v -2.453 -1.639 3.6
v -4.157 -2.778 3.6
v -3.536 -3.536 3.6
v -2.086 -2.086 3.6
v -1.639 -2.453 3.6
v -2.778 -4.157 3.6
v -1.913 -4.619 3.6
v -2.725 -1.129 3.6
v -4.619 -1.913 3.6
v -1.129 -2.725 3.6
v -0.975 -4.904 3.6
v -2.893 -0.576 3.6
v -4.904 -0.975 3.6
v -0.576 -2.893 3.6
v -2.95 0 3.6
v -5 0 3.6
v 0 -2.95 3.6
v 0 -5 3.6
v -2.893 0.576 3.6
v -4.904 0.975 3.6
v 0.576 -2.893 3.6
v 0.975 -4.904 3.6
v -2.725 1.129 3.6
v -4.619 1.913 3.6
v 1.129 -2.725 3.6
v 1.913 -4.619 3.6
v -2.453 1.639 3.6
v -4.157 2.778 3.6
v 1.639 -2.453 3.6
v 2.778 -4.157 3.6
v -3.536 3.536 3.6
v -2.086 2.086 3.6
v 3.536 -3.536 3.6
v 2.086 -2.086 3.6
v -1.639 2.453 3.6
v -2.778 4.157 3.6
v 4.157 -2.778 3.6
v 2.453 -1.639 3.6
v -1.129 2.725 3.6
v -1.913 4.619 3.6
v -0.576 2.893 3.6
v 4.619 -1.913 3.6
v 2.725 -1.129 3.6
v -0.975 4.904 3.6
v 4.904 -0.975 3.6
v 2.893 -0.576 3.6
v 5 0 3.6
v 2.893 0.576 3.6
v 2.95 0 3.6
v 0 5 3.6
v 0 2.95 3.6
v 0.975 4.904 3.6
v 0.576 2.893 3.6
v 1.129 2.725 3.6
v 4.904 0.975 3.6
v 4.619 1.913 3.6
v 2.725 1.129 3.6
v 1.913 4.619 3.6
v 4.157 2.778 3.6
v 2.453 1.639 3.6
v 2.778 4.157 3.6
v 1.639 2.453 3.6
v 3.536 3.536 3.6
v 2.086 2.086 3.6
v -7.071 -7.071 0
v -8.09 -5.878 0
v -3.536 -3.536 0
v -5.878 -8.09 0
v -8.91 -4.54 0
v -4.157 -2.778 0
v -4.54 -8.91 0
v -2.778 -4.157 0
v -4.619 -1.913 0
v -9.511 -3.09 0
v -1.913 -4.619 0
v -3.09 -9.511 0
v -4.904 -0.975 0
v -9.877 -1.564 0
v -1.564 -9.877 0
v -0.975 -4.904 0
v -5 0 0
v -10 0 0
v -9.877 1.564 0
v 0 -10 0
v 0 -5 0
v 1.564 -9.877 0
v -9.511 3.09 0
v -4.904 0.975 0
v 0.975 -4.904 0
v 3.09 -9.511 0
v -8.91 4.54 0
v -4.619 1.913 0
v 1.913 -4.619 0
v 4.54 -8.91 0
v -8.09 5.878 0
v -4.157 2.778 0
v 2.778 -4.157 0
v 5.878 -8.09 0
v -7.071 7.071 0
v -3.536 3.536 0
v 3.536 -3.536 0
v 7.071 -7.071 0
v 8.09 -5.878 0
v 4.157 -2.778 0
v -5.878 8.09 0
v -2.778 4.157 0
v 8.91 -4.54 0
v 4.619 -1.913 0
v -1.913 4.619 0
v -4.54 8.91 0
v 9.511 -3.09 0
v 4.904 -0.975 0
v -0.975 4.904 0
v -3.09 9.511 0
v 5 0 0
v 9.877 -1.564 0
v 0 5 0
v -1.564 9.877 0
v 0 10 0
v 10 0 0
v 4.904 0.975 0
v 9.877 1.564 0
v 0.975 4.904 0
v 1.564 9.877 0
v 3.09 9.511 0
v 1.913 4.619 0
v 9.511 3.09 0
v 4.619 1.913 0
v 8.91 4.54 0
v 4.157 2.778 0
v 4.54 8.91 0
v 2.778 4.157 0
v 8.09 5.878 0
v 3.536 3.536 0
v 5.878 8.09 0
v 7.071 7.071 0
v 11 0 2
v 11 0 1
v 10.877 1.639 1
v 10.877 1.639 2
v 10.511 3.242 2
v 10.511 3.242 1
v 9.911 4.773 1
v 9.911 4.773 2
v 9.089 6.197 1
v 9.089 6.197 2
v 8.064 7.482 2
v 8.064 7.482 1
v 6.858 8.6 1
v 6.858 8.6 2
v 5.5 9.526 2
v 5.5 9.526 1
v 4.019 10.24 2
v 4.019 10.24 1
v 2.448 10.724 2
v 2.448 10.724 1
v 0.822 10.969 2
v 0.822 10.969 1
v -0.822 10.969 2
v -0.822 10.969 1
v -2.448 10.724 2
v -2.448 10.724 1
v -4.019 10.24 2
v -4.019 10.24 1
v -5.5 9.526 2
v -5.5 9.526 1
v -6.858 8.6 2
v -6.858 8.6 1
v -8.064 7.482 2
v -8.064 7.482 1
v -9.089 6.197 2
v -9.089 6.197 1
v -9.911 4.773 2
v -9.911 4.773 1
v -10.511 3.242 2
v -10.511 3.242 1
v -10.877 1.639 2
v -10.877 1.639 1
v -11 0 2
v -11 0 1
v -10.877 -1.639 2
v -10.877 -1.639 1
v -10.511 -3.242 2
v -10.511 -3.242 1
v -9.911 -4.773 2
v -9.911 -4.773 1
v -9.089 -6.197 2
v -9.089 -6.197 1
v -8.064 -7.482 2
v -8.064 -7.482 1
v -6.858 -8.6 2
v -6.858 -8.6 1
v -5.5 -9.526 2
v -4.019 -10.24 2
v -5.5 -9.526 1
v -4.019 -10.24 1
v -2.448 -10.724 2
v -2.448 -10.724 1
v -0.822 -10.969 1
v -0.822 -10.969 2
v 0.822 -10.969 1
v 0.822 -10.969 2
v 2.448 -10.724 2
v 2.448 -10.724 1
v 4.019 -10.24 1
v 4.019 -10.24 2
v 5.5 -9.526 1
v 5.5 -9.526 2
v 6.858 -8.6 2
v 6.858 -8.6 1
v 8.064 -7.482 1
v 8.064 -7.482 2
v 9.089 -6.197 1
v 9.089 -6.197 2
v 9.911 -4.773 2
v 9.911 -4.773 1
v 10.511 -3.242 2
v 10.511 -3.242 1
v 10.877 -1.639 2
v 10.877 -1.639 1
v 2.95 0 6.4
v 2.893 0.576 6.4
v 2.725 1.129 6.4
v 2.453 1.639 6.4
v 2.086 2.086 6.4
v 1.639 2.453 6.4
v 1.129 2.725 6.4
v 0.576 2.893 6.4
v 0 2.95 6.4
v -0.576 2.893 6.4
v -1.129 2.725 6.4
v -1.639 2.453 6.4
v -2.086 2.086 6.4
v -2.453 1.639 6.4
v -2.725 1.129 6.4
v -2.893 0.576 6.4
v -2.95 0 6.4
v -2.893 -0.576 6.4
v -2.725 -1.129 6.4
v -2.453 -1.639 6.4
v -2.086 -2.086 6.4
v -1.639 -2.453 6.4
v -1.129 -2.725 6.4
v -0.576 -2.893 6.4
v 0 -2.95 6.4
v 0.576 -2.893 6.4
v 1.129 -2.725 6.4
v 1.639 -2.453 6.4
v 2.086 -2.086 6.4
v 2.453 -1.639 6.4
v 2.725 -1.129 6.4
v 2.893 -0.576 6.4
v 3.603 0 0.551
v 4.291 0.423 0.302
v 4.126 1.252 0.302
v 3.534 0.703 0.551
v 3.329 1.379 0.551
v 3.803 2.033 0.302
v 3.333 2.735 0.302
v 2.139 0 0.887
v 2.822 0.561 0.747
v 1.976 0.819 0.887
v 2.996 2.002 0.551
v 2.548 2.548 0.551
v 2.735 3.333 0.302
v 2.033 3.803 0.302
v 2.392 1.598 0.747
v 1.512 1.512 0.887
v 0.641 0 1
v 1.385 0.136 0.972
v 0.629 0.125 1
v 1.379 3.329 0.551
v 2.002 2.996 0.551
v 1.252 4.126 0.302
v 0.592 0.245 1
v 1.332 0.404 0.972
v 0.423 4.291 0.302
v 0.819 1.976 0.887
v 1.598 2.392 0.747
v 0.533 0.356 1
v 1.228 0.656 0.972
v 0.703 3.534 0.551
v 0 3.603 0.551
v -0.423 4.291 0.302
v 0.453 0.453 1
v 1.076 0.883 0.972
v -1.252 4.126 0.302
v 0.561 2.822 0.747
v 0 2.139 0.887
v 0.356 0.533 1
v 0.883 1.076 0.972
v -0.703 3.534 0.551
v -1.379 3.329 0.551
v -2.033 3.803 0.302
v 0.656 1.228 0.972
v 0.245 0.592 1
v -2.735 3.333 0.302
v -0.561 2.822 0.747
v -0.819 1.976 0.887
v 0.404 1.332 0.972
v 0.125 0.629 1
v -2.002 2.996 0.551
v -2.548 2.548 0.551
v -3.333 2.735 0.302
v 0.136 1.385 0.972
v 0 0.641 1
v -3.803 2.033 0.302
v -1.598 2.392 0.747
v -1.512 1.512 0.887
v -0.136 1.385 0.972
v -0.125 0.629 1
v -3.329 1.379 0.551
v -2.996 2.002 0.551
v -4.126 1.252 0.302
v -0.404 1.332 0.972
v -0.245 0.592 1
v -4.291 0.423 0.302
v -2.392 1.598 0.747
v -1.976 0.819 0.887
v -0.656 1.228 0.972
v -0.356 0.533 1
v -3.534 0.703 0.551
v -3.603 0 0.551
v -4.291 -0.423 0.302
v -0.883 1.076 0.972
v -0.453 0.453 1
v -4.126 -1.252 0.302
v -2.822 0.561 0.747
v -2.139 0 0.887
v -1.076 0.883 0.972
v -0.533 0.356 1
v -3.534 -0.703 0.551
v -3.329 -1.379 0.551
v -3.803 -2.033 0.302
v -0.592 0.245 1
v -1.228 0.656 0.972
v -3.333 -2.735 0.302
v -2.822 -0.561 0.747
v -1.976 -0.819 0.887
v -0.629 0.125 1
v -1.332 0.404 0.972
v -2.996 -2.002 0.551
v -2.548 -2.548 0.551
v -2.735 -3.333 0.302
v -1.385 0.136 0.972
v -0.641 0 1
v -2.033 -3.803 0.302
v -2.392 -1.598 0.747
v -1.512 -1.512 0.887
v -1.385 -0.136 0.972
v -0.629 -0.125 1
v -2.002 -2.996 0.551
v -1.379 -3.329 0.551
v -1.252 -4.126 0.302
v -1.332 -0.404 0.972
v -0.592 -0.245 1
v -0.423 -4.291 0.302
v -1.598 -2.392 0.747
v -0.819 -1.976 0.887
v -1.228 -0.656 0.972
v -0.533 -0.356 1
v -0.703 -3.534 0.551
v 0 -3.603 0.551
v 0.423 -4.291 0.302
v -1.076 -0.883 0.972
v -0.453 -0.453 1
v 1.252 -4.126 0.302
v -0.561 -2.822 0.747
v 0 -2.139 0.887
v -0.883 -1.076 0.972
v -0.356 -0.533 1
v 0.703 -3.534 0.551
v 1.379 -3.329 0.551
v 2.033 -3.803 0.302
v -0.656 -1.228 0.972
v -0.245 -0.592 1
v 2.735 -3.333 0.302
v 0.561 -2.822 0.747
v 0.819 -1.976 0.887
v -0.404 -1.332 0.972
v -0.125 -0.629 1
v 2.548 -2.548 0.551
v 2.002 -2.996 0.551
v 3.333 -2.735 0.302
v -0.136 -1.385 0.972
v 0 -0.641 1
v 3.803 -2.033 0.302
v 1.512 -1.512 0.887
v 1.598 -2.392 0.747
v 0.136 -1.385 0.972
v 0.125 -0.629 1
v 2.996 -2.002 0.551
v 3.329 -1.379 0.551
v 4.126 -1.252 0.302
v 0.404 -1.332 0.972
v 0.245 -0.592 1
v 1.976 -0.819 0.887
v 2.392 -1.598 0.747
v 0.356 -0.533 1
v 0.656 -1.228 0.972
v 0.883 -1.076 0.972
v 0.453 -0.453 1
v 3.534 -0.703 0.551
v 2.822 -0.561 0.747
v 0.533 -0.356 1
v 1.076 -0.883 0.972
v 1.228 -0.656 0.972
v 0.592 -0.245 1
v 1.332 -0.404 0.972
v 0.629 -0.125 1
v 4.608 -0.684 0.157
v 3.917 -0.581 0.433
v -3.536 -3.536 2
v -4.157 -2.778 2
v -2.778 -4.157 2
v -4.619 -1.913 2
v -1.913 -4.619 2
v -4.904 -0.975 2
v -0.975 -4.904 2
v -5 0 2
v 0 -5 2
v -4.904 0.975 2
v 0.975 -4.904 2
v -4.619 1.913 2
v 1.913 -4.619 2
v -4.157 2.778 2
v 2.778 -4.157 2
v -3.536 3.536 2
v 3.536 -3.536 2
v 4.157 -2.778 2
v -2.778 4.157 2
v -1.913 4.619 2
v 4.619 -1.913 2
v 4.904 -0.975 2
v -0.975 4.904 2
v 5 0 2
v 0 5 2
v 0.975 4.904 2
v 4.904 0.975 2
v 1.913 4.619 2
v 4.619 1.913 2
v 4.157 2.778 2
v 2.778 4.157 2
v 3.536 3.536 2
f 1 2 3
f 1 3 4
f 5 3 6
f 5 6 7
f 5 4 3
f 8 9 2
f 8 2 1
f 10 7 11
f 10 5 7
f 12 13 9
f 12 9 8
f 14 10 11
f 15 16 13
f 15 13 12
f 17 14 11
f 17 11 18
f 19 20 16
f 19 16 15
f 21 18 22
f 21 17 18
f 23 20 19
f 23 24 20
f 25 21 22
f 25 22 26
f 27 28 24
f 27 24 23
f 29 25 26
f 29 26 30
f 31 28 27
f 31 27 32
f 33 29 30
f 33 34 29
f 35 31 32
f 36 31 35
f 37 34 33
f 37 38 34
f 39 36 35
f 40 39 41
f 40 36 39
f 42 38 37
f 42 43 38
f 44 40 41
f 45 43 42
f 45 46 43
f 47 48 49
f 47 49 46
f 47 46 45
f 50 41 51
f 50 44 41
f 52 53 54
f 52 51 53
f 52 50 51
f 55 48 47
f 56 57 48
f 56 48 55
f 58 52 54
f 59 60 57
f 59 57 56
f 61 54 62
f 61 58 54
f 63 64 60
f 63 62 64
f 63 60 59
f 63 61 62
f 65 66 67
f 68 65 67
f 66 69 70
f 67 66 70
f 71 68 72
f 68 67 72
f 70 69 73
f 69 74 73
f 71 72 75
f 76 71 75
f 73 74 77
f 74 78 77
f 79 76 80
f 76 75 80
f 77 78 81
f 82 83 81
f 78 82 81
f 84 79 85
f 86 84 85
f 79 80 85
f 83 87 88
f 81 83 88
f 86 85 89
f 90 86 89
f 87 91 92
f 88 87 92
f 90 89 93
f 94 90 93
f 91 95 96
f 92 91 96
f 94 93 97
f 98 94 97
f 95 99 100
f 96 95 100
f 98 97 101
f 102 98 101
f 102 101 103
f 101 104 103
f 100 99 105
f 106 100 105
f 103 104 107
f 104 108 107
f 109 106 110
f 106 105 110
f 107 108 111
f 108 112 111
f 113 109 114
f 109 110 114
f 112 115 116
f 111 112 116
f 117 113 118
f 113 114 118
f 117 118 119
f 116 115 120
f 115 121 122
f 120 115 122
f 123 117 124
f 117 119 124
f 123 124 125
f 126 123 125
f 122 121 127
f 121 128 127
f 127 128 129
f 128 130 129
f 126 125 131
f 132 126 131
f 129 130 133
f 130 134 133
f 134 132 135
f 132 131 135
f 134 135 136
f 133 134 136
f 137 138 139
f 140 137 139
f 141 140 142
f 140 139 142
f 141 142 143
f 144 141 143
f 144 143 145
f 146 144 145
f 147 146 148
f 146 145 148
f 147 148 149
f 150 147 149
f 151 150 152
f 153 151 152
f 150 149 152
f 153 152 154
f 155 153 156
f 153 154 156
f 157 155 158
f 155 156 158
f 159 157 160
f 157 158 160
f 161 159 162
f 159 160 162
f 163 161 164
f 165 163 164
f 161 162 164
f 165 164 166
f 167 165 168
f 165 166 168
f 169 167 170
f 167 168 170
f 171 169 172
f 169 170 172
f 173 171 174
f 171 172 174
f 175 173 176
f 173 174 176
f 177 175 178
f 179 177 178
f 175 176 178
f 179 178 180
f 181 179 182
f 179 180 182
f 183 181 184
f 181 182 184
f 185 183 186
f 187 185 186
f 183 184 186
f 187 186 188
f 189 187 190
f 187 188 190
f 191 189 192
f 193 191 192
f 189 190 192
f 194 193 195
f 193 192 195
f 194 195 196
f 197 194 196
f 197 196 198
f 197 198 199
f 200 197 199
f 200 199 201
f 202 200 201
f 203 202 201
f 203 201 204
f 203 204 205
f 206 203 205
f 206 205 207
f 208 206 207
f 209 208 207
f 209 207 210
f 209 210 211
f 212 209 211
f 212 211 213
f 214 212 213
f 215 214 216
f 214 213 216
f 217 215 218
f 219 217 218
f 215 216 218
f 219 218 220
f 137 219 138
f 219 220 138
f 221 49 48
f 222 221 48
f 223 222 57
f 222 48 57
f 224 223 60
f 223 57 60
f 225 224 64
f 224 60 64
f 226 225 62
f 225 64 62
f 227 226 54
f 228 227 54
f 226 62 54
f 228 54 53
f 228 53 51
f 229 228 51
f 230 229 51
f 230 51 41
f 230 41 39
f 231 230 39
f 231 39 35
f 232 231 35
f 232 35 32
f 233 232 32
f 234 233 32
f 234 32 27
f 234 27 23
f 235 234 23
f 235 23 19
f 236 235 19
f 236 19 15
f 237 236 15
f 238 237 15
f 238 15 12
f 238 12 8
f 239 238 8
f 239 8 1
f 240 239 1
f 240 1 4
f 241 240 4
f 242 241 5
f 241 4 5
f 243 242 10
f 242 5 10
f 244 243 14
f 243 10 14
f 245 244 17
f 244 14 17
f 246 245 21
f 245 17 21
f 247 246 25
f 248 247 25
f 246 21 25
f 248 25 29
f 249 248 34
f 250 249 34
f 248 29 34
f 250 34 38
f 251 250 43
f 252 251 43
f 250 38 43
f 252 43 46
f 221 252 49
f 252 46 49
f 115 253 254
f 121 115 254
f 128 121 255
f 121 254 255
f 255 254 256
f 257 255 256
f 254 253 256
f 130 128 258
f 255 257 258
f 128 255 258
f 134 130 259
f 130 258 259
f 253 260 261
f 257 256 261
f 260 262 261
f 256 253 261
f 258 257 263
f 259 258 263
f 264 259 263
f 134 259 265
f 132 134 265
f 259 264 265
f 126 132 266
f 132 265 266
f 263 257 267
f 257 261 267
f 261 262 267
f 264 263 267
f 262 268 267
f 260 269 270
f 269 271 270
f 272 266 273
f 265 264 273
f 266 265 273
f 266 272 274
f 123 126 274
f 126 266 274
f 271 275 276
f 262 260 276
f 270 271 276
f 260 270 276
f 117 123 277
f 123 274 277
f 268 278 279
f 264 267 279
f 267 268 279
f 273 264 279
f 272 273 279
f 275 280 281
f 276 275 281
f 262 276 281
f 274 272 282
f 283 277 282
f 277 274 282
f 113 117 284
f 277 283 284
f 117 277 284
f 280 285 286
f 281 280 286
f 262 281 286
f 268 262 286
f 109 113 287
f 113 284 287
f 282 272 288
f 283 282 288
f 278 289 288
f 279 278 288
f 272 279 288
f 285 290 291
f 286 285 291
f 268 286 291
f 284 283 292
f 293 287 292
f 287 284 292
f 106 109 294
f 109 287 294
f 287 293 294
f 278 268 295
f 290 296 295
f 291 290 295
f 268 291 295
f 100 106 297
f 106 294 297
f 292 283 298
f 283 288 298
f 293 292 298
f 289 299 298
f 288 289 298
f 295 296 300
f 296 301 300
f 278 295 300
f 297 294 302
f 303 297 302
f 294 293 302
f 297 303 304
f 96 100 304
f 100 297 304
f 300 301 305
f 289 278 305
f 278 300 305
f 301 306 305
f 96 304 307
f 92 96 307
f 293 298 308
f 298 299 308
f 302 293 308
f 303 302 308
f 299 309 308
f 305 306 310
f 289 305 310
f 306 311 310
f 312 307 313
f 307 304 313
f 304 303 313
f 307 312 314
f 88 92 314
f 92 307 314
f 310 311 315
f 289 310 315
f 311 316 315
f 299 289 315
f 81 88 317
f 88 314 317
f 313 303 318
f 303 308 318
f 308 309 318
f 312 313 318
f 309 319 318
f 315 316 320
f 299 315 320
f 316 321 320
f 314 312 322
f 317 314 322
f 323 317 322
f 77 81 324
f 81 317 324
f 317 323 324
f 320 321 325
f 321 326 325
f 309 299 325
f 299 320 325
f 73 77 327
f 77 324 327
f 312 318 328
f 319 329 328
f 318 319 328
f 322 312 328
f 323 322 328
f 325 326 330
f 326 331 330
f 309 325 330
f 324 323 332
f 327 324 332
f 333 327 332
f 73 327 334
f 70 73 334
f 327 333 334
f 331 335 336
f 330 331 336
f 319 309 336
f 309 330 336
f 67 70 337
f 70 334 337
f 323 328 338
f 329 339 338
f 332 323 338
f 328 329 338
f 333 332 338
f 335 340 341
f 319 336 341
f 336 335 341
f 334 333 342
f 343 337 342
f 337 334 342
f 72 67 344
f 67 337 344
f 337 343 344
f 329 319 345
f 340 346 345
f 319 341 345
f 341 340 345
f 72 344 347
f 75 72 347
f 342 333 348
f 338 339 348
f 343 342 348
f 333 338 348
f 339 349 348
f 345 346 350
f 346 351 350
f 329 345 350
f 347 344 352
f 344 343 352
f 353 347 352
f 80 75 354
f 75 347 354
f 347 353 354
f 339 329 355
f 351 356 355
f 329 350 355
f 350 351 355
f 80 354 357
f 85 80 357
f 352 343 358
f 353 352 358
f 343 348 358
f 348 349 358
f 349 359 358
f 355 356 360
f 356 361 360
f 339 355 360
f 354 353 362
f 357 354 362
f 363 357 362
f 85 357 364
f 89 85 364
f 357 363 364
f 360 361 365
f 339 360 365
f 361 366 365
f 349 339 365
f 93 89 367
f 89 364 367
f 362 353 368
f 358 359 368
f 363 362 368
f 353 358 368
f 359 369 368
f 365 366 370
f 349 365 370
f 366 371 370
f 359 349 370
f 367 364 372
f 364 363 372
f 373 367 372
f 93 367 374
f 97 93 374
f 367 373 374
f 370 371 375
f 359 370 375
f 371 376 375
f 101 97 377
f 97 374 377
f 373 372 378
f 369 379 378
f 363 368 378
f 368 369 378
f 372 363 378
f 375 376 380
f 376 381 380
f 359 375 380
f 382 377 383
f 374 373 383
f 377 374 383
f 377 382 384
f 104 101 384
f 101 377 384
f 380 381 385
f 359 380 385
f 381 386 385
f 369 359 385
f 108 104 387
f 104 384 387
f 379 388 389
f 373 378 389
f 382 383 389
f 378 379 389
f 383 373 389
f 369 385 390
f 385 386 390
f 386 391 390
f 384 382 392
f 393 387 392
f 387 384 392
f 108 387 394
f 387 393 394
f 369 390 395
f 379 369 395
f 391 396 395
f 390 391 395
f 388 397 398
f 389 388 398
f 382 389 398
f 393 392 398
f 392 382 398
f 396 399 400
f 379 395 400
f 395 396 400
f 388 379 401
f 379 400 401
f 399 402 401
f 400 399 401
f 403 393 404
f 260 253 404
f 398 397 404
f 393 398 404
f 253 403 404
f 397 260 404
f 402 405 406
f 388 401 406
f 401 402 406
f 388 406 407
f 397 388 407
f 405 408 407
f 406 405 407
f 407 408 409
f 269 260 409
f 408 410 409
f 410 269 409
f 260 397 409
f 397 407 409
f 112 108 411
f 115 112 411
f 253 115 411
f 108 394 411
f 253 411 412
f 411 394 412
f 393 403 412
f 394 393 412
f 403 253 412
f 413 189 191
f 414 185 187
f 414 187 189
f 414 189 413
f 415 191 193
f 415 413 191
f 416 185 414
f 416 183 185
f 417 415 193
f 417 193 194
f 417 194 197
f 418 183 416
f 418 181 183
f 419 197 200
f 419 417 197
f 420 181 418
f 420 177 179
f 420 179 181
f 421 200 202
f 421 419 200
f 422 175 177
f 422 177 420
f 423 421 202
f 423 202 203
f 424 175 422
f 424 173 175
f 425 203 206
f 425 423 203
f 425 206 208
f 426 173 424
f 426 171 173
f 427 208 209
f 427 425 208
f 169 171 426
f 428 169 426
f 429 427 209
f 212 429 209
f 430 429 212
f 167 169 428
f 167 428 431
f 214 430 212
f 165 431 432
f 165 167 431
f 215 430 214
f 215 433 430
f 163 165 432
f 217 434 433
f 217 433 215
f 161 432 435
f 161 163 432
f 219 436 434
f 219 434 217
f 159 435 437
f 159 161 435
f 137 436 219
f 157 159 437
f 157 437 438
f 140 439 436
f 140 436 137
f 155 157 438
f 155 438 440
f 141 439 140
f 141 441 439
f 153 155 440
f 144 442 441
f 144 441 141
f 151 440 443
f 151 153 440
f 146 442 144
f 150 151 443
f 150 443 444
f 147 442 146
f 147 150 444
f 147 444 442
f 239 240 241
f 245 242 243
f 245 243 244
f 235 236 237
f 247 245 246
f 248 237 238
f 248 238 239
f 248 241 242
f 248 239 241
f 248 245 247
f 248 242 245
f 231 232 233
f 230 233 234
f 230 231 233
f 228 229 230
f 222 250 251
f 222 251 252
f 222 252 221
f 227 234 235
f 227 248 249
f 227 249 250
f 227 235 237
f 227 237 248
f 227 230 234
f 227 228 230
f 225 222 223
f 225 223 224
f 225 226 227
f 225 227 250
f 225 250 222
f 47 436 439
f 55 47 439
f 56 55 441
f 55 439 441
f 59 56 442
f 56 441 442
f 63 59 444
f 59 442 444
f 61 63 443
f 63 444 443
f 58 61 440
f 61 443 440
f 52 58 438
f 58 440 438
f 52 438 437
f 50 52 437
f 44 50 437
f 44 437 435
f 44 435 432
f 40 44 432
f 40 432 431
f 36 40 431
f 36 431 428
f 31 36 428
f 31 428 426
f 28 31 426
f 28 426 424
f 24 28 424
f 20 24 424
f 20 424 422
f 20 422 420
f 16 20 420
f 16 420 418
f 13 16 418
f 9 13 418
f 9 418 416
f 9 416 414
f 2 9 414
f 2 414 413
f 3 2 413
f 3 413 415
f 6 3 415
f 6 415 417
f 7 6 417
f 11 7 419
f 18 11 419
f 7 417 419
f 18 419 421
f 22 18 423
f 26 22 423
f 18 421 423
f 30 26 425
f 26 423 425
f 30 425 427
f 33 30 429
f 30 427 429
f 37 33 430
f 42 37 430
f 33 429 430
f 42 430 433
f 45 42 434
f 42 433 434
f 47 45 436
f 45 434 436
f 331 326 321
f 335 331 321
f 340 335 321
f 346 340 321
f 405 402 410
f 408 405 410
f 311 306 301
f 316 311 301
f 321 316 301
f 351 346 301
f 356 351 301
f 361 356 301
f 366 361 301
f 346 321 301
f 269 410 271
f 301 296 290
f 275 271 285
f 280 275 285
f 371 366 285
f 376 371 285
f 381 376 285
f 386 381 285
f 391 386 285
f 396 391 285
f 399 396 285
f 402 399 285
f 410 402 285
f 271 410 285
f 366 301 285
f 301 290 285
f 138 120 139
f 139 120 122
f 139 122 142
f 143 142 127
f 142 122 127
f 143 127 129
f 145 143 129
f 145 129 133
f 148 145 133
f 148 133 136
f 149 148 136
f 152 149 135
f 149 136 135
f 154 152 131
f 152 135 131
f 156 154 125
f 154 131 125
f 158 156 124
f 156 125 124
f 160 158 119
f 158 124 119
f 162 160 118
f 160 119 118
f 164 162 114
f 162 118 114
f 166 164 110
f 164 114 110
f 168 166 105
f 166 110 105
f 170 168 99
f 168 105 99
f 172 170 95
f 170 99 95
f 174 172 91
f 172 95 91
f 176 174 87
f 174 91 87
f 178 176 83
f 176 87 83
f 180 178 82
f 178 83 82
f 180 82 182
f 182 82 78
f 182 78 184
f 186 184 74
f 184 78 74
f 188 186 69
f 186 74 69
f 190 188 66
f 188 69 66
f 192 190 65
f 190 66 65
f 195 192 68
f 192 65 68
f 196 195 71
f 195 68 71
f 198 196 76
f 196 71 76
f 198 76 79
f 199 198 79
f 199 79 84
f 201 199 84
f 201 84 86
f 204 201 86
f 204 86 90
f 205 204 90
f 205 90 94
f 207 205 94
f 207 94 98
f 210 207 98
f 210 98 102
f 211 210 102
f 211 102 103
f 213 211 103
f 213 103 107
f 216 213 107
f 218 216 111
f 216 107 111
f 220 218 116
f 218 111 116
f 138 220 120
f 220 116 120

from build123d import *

# Parameters (mm, degrees)
F0_R     = 11
F0_R_2   = 5
F1_DEPTH = 2
F0_R_3   = 2.95
F2_DEPTH = 3.6
F0_R_4   = 1.8
F3_DEPTH = 6.4
F4_DEPTH = 1
F5_SIZE  = 1


# Not quite as in the source:
# - a fillet or chamfer that OpenCascade refuses, or shapes differently, is made with other operations: its cross-section is extruded or revolved along the edge and cut away or added
# - a feature of the source that left no trace in its solid (it failed there, or was rolled back) is left out


with BuildPart() as f1:
    # F0 (on Top) → F1 (new body)
    with BuildSketch(Plane.XY):
        Circle(F0_R)
        Circle(F0_R_2, mode=Mode.SUBTRACT)
    extrude(amount=F1_DEPTH)

    # F0 (on Top) → F2 (join)
    with BuildSketch(Plane.XY):
        Circle(F0_R_2)
        Circle(F0_R_3, mode=Mode.SUBTRACT)
    extrude(amount=F2_DEPTH)

    # F0 (on Top) → F3 (join)
    with BuildSketch(Plane.XY):
        Circle(F0_R_3)
        Circle(F0_R_4, mode=Mode.SUBTRACT)
        Circle(F0_R_4)
    extrude(amount=F3_DEPTH)

    # F0 (on Top) → F4 (cut)
    with BuildSketch(Plane.XY):
        Circle(F0_R_2)
        Circle(F0_R_3, mode=Mode.SUBTRACT)
        Circle(F0_R_3)
        Circle(F0_R_4, mode=Mode.SUBTRACT)
        Circle(F0_R_4)
    extrude(amount=F4_DEPTH, mode=Mode.SUBTRACT)

    # F5
    f5_edges = [f1.edges().sort_by_distance(p)[0] for p in [
        (-11, 0, 0),
    ]]
    chamfer(f5_edges, length=F5_SIZE)

    # F6: fillet of radius 10 on 1 edges, made by hand

    # F6_s1 → F6_t2 (revolve)
    with BuildSketch(Plane.XZ):
        with BuildLine():
            ThreePointArc((5, 0), (2.877169034, 0.7467943448), (0.6411010565, 1))
            Line((0.6411010565, 1), (5, 1))
            Line((5, 1), (5, 0))
        make_face()
    revolve(axis=Axis((0, 0, 1), (0, 0, 1)))


solid = f1.part
